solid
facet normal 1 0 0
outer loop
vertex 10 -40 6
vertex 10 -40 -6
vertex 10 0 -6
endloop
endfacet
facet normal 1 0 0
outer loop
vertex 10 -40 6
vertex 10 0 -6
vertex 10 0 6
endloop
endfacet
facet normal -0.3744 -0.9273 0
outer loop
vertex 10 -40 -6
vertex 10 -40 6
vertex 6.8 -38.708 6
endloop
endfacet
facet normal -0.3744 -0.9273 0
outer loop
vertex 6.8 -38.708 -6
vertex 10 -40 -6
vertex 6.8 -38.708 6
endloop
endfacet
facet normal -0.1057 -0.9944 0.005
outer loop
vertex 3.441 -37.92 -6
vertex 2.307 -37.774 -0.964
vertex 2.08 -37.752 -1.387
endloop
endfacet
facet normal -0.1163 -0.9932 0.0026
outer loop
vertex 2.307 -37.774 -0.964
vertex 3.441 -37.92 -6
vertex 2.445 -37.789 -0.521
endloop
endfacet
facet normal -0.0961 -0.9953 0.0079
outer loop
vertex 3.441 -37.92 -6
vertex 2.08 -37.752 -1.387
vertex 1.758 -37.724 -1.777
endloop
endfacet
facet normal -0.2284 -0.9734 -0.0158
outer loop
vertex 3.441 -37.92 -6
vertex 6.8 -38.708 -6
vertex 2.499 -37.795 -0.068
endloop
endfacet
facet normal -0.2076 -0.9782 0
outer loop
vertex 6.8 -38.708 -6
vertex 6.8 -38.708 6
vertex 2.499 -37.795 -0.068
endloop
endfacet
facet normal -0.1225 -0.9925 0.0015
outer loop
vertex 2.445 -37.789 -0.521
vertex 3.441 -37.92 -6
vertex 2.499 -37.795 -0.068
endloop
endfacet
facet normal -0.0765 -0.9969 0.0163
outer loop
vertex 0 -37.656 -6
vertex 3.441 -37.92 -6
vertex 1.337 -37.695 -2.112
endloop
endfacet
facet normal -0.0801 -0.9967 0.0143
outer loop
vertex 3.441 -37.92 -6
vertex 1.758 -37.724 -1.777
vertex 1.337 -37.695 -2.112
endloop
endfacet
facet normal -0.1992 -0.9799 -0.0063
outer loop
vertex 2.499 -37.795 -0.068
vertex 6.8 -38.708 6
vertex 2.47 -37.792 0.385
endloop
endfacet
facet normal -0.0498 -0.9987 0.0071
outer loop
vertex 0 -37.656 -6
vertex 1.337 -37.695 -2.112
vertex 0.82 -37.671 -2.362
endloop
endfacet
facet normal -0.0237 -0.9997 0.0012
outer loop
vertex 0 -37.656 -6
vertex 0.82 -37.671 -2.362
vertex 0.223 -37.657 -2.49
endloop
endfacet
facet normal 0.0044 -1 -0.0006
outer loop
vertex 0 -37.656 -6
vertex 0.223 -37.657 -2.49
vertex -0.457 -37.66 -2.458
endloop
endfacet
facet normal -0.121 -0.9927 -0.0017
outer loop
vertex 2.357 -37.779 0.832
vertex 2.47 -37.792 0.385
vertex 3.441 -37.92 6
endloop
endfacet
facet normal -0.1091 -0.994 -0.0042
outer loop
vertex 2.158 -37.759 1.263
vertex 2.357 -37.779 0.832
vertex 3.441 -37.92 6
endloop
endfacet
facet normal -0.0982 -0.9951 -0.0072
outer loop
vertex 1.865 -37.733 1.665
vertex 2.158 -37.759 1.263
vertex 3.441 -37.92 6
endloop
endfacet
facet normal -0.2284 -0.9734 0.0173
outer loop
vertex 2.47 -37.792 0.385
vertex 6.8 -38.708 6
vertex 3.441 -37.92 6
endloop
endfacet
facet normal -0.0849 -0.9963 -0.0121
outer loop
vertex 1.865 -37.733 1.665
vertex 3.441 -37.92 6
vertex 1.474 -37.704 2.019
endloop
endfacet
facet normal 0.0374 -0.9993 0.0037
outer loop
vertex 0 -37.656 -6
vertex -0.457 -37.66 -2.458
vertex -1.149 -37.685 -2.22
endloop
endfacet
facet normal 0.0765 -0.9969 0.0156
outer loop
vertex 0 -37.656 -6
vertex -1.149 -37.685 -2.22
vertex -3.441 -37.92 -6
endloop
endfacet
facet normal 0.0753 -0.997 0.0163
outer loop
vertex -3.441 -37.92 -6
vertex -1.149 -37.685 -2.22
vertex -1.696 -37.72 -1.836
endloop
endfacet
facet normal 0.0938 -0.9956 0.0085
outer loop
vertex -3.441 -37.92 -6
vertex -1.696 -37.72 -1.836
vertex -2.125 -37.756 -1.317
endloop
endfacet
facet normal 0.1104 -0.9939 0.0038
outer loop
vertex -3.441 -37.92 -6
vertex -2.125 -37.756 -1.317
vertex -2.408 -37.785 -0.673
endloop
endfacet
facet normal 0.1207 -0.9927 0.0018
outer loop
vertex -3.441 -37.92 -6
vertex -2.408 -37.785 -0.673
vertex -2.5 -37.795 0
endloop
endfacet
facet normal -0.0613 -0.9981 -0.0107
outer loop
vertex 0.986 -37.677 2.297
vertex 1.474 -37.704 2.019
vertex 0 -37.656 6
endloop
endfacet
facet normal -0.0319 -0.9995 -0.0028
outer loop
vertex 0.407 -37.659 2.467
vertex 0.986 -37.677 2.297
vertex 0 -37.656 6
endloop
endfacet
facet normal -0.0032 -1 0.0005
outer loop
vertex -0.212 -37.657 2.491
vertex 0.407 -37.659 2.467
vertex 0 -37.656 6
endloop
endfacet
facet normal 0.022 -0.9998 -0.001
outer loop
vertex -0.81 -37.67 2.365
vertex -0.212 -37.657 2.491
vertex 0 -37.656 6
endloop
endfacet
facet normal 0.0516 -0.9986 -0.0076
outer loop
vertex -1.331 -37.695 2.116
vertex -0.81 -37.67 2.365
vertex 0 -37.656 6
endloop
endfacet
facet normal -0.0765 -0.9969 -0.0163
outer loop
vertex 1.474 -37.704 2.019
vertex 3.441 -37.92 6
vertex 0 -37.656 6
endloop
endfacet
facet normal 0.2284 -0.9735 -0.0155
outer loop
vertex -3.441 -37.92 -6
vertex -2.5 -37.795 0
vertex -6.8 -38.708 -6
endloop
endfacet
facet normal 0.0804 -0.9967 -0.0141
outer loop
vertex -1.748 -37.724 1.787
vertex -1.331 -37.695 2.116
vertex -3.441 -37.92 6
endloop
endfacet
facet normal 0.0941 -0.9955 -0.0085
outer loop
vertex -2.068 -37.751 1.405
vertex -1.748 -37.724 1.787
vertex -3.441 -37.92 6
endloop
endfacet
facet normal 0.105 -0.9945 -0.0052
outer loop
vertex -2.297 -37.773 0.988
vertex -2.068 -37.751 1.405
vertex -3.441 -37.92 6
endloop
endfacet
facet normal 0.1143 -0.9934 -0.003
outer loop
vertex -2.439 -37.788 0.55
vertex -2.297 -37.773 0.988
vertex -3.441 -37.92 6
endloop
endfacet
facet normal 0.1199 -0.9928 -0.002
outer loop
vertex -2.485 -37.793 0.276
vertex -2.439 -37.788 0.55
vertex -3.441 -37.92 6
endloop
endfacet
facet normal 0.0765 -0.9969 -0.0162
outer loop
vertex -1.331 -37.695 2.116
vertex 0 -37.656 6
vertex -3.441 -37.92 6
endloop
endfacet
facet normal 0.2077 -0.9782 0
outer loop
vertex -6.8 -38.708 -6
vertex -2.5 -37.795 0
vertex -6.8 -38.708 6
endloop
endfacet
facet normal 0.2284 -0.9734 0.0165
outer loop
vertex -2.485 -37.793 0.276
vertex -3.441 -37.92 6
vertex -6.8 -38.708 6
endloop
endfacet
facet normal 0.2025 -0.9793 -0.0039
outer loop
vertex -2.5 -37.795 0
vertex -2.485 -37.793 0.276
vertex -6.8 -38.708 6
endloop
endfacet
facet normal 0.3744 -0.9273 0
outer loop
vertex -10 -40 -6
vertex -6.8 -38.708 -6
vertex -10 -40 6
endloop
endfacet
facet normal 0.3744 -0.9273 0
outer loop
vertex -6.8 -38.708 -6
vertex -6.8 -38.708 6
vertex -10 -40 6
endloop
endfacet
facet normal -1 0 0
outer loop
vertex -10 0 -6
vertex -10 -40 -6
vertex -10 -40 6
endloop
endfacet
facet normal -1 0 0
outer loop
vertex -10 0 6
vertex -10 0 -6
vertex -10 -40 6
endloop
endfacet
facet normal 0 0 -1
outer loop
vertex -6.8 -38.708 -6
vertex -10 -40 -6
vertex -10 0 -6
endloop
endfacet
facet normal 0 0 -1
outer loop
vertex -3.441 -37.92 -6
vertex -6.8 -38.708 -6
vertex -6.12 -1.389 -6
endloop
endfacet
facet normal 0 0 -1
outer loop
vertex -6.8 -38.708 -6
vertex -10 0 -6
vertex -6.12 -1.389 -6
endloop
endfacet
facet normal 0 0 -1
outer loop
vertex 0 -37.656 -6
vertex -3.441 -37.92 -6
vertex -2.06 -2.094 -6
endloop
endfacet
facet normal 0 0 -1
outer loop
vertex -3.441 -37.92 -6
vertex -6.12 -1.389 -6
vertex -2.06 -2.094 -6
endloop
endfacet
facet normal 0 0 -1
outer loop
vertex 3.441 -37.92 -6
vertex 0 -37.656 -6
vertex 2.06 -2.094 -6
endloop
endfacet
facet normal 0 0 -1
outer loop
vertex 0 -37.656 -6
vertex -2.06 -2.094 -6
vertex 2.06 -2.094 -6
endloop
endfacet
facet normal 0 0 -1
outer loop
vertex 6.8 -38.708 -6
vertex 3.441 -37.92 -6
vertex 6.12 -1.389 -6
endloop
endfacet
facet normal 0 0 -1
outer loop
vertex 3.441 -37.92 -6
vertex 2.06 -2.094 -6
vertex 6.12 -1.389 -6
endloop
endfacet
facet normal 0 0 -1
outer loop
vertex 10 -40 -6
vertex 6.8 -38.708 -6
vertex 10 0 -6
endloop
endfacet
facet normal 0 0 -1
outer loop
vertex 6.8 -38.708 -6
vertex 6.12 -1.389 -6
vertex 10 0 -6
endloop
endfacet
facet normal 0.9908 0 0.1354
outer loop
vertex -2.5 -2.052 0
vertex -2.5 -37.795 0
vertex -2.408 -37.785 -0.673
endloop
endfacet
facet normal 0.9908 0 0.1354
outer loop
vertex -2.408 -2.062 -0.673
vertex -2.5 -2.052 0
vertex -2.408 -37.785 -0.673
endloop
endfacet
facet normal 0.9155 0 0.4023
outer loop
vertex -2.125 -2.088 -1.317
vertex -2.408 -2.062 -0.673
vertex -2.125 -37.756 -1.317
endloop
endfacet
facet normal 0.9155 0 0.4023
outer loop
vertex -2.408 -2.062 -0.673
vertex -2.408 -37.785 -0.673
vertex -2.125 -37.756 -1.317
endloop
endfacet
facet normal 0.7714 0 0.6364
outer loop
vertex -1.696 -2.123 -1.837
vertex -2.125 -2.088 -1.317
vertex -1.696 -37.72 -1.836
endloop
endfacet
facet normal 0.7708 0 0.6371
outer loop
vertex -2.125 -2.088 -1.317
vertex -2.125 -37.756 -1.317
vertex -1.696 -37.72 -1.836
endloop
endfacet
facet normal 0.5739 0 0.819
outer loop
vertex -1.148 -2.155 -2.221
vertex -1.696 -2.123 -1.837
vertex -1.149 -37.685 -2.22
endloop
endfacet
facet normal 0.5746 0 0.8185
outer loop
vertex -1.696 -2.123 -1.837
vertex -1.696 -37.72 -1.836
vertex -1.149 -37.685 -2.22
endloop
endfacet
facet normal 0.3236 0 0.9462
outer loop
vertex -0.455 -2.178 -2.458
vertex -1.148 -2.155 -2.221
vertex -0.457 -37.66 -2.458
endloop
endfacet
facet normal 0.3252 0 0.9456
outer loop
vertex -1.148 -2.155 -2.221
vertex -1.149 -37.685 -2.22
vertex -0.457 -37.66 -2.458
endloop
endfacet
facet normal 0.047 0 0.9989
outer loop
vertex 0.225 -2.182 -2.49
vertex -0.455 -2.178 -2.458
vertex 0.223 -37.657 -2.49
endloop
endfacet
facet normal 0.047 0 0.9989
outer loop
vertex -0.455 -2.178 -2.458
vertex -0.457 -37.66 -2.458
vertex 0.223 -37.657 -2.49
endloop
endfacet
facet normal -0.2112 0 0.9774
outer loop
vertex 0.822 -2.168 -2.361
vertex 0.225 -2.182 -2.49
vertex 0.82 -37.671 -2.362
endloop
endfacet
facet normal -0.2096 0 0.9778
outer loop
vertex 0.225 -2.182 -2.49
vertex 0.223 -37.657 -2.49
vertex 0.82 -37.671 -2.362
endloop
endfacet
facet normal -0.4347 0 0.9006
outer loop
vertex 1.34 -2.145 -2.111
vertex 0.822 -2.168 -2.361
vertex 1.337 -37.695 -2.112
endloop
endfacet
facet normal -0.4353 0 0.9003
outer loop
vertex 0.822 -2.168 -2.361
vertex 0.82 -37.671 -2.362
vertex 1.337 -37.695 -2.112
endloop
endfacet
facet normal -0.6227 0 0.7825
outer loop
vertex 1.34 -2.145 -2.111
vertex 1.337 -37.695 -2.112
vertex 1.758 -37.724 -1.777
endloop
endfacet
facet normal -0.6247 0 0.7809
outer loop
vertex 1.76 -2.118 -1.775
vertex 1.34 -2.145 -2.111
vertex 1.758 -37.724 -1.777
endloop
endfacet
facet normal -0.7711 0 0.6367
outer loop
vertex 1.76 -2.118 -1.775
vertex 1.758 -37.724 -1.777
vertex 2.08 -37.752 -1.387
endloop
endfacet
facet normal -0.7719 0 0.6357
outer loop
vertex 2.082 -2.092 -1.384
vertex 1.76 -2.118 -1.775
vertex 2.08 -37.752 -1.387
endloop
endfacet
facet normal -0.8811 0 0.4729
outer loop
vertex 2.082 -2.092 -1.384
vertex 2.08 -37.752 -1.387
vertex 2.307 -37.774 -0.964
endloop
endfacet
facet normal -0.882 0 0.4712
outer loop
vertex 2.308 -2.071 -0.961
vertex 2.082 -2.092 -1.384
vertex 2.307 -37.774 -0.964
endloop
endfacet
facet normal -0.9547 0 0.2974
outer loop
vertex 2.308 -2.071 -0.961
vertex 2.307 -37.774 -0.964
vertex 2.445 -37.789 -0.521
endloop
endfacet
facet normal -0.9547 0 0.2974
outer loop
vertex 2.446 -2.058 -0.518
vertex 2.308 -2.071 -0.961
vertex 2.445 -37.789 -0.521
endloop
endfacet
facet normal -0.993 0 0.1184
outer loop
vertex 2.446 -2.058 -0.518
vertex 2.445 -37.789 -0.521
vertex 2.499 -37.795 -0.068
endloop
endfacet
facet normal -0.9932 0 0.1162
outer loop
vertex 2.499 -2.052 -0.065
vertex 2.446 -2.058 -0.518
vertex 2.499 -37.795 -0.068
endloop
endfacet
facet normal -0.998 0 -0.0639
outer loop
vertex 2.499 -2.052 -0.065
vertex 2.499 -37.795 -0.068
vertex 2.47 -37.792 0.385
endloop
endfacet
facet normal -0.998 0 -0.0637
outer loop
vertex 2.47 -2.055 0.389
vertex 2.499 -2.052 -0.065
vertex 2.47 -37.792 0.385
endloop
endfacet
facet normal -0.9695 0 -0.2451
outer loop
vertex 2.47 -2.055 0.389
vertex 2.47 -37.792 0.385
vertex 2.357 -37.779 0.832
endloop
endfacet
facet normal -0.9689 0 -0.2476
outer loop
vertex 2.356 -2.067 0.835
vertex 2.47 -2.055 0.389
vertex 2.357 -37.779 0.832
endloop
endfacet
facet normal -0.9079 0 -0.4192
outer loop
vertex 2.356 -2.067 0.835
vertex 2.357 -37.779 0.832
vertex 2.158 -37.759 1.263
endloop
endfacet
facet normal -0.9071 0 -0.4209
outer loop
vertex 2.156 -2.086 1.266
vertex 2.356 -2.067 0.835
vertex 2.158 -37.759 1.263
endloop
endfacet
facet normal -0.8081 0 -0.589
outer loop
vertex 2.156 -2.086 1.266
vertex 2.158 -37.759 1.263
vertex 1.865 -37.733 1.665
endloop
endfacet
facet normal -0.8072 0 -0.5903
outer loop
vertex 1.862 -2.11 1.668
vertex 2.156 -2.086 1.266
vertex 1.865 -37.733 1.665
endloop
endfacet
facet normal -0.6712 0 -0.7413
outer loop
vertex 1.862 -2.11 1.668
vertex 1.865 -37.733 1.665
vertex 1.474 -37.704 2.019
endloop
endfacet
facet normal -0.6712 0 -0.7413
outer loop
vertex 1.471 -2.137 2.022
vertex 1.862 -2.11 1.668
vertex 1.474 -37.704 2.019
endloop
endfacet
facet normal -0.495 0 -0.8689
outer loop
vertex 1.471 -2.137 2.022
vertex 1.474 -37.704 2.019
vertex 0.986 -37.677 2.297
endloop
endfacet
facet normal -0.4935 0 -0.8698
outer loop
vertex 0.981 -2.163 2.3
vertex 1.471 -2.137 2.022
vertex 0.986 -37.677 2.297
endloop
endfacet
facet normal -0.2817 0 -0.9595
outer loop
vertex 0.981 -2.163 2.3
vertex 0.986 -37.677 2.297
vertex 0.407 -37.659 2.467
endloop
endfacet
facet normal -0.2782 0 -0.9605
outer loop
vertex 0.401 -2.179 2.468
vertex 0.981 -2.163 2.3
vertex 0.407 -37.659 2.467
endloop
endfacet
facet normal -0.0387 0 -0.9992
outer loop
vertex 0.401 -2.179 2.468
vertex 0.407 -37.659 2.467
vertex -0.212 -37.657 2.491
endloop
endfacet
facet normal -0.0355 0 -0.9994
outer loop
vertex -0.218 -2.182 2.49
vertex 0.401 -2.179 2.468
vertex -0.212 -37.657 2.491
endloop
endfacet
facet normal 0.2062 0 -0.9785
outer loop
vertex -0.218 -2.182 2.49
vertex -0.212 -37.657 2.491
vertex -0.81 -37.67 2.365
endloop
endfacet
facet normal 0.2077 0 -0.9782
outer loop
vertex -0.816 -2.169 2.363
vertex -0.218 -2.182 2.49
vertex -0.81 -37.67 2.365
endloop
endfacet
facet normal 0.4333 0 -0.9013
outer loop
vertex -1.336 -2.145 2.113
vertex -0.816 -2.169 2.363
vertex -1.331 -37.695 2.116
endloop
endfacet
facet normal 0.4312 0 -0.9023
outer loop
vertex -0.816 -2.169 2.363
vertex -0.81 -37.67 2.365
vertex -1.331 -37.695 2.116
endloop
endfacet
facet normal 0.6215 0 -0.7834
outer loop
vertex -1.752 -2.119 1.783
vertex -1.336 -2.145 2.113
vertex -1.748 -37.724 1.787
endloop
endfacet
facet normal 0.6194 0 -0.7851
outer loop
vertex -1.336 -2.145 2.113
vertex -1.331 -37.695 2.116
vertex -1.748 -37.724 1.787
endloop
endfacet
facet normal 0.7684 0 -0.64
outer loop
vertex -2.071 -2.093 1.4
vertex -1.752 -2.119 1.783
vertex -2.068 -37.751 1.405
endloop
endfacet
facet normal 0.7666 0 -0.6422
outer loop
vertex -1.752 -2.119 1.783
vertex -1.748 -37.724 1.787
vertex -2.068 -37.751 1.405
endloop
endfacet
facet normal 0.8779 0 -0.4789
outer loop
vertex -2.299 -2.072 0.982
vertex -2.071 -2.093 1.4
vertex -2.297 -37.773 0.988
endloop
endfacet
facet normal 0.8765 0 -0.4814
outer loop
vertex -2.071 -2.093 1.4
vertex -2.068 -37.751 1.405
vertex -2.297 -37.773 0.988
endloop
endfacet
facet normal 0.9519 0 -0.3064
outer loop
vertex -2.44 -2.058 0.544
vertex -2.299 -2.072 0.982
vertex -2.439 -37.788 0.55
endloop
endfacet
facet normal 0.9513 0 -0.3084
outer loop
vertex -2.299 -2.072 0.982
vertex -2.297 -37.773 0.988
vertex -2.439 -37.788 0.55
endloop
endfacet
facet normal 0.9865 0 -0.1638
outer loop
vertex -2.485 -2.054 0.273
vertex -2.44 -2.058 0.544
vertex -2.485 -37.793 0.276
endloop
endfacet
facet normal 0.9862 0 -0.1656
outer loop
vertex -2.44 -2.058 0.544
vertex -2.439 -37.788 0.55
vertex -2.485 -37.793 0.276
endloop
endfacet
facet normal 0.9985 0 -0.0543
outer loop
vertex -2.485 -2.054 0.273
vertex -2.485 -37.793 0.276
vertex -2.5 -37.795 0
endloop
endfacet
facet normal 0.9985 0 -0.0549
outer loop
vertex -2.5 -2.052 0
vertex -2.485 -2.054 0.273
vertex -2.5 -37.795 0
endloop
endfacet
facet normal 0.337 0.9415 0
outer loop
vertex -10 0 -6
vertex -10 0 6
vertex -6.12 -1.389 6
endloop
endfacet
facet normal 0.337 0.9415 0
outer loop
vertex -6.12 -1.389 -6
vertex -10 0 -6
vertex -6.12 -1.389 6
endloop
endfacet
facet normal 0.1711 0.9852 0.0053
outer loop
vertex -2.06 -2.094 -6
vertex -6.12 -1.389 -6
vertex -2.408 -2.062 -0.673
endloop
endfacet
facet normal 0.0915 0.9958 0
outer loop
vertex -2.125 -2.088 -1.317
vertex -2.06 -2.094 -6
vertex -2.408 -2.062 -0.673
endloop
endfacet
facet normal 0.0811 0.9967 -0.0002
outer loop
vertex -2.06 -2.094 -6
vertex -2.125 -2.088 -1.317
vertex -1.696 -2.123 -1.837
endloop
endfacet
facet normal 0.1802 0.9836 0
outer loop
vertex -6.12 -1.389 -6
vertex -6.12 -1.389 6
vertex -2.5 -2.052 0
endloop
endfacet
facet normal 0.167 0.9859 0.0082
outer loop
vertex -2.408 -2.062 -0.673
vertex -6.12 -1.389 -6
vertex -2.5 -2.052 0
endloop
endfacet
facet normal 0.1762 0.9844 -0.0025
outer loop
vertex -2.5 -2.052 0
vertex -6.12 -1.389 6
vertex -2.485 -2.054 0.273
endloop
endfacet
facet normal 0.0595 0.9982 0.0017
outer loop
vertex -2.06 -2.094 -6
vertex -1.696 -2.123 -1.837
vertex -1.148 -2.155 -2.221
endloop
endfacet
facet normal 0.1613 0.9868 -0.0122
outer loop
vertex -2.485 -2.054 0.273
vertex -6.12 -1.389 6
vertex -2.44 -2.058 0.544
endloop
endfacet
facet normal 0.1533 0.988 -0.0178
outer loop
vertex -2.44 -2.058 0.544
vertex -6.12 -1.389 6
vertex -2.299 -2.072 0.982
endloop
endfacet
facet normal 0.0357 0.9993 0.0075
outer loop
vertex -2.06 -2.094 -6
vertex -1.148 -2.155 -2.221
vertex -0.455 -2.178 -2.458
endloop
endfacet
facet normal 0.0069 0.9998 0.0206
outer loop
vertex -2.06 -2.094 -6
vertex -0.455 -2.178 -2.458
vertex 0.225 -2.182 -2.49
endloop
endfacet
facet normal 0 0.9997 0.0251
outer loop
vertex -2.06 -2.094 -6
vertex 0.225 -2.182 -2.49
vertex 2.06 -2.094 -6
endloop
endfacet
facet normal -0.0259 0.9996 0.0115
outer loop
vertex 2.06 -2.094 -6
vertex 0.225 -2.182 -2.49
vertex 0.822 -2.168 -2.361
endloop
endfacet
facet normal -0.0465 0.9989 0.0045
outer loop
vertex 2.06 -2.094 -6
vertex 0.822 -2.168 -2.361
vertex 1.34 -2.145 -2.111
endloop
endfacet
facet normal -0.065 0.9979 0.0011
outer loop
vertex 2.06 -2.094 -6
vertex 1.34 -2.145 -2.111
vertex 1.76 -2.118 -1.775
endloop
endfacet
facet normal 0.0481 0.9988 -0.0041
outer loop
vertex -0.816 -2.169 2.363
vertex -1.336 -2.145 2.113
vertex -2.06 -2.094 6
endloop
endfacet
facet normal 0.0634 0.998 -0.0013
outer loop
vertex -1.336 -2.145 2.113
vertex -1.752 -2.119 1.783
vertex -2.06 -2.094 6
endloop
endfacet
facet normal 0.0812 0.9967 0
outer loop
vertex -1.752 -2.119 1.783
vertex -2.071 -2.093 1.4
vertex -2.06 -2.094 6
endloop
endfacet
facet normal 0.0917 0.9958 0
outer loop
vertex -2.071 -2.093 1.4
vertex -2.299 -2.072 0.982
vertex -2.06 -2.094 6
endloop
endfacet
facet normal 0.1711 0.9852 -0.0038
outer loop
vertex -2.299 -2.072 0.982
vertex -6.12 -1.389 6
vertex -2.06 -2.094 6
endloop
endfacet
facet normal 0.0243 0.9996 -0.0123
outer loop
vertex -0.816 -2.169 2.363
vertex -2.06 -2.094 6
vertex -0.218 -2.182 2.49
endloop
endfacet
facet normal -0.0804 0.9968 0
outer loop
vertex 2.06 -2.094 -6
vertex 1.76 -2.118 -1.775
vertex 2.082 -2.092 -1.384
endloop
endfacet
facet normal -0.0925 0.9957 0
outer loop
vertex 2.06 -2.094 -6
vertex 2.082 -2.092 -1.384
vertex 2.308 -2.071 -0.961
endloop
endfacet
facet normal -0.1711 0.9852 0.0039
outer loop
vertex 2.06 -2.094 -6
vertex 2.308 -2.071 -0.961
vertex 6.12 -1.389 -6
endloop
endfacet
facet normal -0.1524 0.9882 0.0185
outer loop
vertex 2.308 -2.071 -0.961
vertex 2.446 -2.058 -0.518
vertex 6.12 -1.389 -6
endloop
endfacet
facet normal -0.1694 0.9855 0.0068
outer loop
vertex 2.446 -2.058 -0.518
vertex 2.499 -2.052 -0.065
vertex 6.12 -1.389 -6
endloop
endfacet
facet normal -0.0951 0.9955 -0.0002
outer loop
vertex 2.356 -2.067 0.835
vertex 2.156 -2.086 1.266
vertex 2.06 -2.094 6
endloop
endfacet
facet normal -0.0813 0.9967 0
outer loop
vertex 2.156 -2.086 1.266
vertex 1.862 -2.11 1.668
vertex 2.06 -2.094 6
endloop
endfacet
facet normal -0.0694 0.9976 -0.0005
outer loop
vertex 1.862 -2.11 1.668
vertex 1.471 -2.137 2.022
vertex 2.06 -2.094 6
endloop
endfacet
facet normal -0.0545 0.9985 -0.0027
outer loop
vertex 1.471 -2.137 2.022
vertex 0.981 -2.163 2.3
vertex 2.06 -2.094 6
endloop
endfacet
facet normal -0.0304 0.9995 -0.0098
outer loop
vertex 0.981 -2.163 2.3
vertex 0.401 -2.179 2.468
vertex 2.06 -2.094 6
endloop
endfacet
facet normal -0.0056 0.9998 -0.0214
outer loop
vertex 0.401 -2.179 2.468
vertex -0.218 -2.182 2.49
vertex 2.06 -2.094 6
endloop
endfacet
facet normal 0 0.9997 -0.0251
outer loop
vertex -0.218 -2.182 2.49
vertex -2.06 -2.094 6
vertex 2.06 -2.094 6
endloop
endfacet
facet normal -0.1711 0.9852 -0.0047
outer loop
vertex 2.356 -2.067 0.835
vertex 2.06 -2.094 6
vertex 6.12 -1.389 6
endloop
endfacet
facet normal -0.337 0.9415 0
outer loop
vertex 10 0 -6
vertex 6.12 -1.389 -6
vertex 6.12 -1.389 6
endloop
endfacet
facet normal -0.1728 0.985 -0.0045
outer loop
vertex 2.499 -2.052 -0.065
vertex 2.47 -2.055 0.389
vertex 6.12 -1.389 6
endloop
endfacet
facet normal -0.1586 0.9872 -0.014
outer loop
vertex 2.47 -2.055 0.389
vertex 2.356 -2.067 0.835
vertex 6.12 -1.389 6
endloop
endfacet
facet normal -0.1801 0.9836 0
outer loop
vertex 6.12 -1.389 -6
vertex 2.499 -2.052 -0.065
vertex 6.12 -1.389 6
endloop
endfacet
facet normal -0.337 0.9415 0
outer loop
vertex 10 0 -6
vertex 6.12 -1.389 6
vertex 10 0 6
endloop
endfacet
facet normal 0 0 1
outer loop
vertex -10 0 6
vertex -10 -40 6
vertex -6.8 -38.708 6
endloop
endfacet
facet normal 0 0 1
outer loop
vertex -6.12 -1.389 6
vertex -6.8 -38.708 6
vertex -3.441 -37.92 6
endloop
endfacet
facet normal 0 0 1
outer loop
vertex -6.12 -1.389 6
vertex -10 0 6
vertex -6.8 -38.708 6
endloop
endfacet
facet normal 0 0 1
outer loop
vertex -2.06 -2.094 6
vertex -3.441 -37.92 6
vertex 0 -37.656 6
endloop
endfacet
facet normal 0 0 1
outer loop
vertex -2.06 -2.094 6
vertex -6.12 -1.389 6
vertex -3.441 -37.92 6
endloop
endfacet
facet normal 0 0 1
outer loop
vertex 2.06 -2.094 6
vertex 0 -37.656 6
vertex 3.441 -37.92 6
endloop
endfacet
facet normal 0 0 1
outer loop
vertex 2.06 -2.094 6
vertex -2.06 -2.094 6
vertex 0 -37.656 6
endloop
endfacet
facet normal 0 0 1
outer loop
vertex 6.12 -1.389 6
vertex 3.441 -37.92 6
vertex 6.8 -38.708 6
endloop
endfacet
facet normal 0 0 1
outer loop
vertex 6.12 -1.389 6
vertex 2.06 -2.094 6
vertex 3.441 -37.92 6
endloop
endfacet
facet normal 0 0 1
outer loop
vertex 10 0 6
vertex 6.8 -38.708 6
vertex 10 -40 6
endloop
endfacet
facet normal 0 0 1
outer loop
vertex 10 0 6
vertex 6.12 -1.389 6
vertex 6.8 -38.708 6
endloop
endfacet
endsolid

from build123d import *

# Parameters (mm, degrees)
F0_W     = 20
F0_H     = 12
F1_DEPTH = 40
F3_DEPTH = 16
F5_D     = 5


with BuildPart() as f1:
    # F0 (on Front) → F1 (new body)
    with BuildSketch(Plane.XZ):
        Rectangle(F0_W, F0_H)
    extrude(amount=F1_DEPTH)

    # F2 (on face) → F3 (cut)
    with BuildSketch(Plane.XY.offset(6)):
        with BuildLine():
            Line((10, 0), (-10, 0))
            ThreePointArc((-10, 0), (0, -2.182576), (10, 0))
        make_face()
        with BuildLine():
            Line((-10, -40), (10, -40))
            ThreePointArc((10, -40), (0, -37.655644), (-10, -40))
        make_face()
    extrude(amount=-F3_DEPTH, mode=Mode.SUBTRACT)

    # F5 (through all)
    with Locations(Plane(origin=(0, 0, 0), x_dir=(1, 0, 0), z_dir=(0, 1, 0))):
        with Locations((0, 0)):
            Hole(F5_D / 2)


solid = f1.part
